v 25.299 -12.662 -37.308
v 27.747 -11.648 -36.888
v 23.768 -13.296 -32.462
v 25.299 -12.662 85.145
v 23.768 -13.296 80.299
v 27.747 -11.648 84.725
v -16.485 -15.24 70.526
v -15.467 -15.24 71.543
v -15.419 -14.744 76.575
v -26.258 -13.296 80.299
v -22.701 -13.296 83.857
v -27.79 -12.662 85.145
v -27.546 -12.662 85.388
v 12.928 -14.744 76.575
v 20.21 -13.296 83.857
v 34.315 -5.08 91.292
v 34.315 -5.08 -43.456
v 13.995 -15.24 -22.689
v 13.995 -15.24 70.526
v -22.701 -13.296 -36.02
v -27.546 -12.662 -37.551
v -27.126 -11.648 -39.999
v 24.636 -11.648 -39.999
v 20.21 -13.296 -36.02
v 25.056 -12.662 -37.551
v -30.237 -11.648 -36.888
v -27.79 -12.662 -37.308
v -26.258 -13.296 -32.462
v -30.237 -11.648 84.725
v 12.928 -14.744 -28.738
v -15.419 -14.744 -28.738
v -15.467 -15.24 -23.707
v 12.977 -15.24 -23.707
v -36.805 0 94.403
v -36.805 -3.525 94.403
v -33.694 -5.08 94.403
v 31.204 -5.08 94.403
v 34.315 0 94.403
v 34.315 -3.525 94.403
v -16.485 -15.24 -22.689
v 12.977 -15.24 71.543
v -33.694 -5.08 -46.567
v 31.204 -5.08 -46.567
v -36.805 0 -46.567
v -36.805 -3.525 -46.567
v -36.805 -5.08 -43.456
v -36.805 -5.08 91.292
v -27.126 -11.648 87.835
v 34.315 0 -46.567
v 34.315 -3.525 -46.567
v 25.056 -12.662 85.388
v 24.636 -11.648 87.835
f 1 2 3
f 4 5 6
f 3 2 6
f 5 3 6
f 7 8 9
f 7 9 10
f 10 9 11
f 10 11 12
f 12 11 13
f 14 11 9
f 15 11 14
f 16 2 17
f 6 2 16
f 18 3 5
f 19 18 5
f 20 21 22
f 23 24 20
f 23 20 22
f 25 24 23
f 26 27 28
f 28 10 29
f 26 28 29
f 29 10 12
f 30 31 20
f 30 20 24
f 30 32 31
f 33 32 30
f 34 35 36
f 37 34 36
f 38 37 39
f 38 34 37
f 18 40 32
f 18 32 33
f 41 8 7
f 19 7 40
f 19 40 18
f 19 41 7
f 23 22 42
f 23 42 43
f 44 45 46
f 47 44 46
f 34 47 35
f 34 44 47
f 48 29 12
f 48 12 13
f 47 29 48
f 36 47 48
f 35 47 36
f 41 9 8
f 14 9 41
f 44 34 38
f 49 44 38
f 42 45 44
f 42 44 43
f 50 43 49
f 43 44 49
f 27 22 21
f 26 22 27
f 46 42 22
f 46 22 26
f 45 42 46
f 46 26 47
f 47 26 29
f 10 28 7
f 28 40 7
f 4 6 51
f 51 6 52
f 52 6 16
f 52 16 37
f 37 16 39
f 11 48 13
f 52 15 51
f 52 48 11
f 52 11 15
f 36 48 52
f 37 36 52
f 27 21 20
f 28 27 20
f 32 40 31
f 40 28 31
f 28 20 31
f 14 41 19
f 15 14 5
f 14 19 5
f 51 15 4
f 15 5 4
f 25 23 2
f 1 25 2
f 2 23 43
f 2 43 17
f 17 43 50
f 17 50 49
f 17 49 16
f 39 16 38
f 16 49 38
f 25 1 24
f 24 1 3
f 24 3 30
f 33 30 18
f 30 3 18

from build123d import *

# Parameters (mm, degrees)
F0_W        = 71.12
F0_H        = 140.97
F1_DEPTH    = 15.24
F2_SIZE     = 10.16
F3_SIZE     = 5.08
F4_SIZE     = 5.08
F5_SIZE     = 2.54
F6_SIZE     = 2.54
F7_T1_DEPTH = 24.5183278918
F7_T3_DEPTH = 24.5183278918
F7_T5_DEPTH = 24.5183278918
F7_T7_DEPTH = 24.5183278918


# Not quite as in the source:
# - a fillet or chamfer that OpenCascade refuses, or shapes differently, is made with other operations: its cross-section is extruded or revolved along the edge and cut away or added


with BuildPart() as f1:
    # F0 (on Front) → F1 (new body)
    with BuildSketch(Plane.XZ):
        with Locations((-1.2450981867, 23.9183327848)):
            Rectangle(F0_W, F0_H)
    extrude(amount=F1_DEPTH)

    # F2
    f2_edges = [f1.edges().sort_by_distance(p)[0] for p in [
        (-1.245098, -15.24, 94.403333),
        (34.314902, -15.24, 23.918333),
        (-36.805098, -15.24, 23.918333),
        (-1.245098, -15.24, -46.566667),
    ]]
    chamfer(f2_edges, length=F2_SIZE)

    # F3
    f3_edges = [f1.edges().sort_by_distance(p)[0] for p in [
        (-26.645098, -15.24, 23.918333),
        (-1.245098, -15.24, -36.406667),
        (24.154902, -15.24, 23.918333),
        (-1.245098, -15.24, 84.243333),
    ]]
    chamfer(f3_edges, length=F3_SIZE)

    # F4
    f4_edges = [f1.edges().sort_by_distance(p)[0] for p in [
        (-1.245098, -15.24, 79.163333),
        (-1.245098, -15.24, -31.326667),
        (-21.565098, -15.24, 23.918333),
        (19.074902, -15.24, 23.918333),
    ]]
    chamfer(f4_edges, length=F4_SIZE)

    # F5
    f5_edges = [f1.edges().sort_by_distance(p)[0] for p in [
        (18.881556, -14.267984, 78.969987),
        (-21.371752, -14.267984, 78.969987),
        (-21.371752, -14.267984, -31.133321),
        (18.881556, -14.267984, -31.133321),
    ]]
    chamfer(f5_edges, length=F5_SIZE)

    # F6
    f6_edges = [f1.edges().sort_by_distance(p)[0] for p in [
        (-1.245098, -15.24, 74.083333),
        (-1.245098, -15.24, -26.246667),
    ]]
    chamfer(f6_edges, length=F6_SIZE)

    # F7: chamfer of 2.54 on 4 edges, made by hand

    # F7_s2 → F7_t1 (cut)
    with BuildSketch(Plane(origin=(29.0610725046, 29.0610725046, -29.0610725046), x_dir=(0.7071067812, -0.7071067812, 0), z_dir=(-0.5773502692, -0.5773502692, 0.5773502692))):
        Polygon((25.6566976907, -27.3564258793), (27.8564022163, -23.5464258793), (27.8564022163, -26.0864258793), align=None)
    extrude(amount=F7_T1_DEPTH, mode=Mode.SUBTRACT)

    # F7_s4 → F7_t3 (cut)
    with BuildSketch(Plane(origin=(45.0066276944, 45.0066276944, 45.0066276944), x_dir=(0.7071067812, -0.7071067812, 0), z_dir=(-0.5773502692, -0.5773502692, -0.5773502692))):
        Polygon((27.8564022163, 62.6048997598), (25.6566976907, 66.4148997598), (27.8564022163, 65.1448997598), align=None)
    extrude(amount=F7_T3_DEPTH, mode=Mode.SUBTRACT)

    # F7_s6 → F7_t5 (cut)
    with BuildSketch(Plane(origin=(-45.8366931523, 45.8366931523, 45.8366931523), x_dir=(0.7071067812, 0.7071067812, 0), z_dir=(0.5773502692, -0.5773502692, -0.5773502692))):
        Polygon((-29.6172369585, 61.5882813474), (-27.4175324329, 65.3982813474), (-29.6172369585, 64.1282813474), align=None)
    extrude(amount=F7_T5_DEPTH, mode=Mode.SUBTRACT)

    # F7_s8 → F7_t7 (cut)
    with BuildSketch(Plane(origin=(-29.8911379624, 29.8911379624, -29.8911379624), x_dir=(0.7071067812, 0.7071067812, 0), z_dir=(0.5773502692, -0.5773502692, 0.5773502692))):
        Polygon((-27.4175324329, -26.3398074669), (-29.6172369585, -22.5298074669), (-29.6172369585, -25.0698074669), align=None)
    extrude(amount=F7_T7_DEPTH, mode=Mode.SUBTRACT)


solid = f1.part
